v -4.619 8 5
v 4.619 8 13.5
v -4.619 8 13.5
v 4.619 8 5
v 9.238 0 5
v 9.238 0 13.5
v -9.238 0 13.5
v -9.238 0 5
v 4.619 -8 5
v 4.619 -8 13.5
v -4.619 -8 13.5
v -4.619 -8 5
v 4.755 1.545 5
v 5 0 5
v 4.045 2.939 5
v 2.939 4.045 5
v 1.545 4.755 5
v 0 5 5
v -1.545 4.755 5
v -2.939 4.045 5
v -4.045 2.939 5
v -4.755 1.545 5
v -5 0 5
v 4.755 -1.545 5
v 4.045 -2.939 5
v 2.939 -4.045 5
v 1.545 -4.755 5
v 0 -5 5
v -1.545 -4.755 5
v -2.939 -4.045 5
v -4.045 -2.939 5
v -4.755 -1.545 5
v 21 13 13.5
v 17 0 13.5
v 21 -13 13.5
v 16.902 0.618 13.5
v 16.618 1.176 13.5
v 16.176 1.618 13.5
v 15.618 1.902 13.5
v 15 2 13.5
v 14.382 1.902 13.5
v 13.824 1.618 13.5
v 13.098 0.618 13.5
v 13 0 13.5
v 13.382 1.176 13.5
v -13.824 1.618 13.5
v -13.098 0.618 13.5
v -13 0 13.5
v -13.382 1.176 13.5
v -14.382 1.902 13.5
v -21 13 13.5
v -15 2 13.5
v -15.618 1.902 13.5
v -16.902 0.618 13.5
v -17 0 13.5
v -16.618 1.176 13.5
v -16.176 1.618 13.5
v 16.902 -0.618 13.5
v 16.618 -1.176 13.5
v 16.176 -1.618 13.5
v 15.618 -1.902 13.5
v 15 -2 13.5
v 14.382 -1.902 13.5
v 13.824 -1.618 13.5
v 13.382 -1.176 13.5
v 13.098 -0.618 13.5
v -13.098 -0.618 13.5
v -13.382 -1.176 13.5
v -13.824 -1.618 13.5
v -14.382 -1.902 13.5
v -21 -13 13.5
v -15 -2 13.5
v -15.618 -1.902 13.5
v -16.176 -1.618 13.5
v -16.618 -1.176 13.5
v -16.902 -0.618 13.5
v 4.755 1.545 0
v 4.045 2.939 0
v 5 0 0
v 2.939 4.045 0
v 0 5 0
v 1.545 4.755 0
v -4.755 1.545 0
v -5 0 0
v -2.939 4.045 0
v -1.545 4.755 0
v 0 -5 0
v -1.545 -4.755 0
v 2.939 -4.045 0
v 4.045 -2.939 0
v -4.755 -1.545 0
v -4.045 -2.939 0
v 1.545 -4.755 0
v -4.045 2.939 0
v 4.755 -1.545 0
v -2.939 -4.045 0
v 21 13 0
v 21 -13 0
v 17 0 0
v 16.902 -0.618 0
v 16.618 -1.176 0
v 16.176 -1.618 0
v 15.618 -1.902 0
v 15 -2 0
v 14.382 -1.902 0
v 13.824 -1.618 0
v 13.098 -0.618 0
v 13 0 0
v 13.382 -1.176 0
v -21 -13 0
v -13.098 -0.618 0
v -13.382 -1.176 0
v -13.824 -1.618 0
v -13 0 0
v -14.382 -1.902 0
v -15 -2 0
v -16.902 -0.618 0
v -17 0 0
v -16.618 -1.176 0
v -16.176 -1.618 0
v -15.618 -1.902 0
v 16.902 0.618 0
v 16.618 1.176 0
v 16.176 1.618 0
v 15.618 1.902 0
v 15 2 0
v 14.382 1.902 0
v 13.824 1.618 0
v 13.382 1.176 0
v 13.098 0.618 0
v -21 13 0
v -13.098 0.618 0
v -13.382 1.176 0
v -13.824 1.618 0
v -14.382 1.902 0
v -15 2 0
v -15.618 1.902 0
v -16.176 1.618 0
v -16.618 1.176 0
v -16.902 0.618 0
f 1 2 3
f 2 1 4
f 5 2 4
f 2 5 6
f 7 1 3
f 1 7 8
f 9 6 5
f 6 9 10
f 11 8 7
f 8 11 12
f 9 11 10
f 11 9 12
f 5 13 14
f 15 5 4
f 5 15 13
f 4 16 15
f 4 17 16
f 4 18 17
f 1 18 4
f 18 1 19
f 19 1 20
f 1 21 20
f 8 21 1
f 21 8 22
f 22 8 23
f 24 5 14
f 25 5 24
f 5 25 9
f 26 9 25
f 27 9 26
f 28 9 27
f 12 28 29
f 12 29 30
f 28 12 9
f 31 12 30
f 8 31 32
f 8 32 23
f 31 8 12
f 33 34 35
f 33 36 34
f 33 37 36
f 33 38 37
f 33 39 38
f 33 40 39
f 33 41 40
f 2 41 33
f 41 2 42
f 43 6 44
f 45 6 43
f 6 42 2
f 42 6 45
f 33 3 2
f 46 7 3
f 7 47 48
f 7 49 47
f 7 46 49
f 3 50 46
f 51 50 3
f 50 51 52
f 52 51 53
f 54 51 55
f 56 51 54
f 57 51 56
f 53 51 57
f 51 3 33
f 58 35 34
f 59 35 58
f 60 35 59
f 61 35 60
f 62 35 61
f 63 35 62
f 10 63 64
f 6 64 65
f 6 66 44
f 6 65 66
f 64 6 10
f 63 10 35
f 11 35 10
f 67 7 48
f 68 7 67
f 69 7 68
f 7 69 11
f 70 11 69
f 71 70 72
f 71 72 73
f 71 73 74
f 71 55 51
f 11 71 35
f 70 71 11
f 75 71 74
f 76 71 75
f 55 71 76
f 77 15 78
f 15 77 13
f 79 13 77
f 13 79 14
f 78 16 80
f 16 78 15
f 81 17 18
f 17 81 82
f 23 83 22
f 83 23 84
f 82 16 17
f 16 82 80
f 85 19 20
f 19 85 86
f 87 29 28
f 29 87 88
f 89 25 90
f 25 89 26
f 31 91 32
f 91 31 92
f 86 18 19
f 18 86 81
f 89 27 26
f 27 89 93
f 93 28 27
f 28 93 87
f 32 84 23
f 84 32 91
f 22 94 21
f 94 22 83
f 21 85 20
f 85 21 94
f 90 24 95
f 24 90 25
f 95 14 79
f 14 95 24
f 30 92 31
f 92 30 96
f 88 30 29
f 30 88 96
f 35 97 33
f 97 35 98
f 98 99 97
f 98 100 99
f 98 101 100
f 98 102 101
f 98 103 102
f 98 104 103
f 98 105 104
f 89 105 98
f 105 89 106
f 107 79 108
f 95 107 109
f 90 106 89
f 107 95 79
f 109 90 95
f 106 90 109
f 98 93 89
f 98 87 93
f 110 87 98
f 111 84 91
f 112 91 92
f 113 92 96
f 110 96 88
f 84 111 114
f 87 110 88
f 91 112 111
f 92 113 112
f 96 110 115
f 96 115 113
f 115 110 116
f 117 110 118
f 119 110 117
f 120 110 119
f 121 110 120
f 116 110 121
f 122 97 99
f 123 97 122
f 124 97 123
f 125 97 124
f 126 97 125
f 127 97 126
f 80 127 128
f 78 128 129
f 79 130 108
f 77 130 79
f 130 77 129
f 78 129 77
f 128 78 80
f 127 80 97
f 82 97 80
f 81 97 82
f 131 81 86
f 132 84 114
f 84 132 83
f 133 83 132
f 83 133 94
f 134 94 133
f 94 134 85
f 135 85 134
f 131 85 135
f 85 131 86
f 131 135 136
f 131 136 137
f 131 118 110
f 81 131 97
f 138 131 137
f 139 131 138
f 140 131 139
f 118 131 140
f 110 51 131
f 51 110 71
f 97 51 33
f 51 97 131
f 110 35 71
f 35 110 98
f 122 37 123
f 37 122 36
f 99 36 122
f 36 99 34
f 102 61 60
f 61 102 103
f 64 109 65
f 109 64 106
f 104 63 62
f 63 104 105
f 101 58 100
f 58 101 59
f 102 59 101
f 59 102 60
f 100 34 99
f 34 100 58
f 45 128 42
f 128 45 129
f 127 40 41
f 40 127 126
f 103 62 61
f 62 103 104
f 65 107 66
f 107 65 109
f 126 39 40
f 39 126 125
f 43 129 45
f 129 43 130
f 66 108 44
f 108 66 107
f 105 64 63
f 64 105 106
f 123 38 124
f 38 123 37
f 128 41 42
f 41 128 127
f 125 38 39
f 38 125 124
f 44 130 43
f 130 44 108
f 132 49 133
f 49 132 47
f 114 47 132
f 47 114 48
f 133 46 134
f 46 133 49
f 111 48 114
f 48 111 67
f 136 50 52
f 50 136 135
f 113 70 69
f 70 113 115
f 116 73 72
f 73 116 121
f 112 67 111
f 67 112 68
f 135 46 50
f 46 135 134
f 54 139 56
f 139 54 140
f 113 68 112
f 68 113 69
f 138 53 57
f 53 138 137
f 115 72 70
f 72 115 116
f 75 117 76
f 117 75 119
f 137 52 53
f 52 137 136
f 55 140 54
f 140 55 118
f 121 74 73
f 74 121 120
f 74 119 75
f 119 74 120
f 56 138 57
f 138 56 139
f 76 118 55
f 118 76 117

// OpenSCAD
$fn = 20;

difference() {
	translate([-21, -13]) cube([42, 26, 13.5]);
	translate([0, 0, 9.25]) ecrou(16, 8.5, 10);
	translate([15, 0, -20]) cylinder(h = 40, r = 2);
	translate([-15, 0, -20]) cylinder(h = 40, r = 2);

}

module ecrou(tailleEcrou, epaisseurEcrou, diametreTige) {
	r = tailleEcrou / (2 * sin(60));
	union() {
		linear_extrude(height = epaisseurEcrou, center = true, convexity = 10, twist = 0)
		polygon(points =	[ [r, 0], 
						[r * cos(60), r * sin(60)], 
						[r * cos(120), r * sin(120)], 
						[r * cos(180), r * sin(180)], 
						[r * cos(240), r * sin(240)], 
						[r * cos(300), r * sin(300)]]);
		translate(v = [0, 0, -10]) {		
			cylinder(h = 100, r = diametreTige / 2);
		}
	}
}
